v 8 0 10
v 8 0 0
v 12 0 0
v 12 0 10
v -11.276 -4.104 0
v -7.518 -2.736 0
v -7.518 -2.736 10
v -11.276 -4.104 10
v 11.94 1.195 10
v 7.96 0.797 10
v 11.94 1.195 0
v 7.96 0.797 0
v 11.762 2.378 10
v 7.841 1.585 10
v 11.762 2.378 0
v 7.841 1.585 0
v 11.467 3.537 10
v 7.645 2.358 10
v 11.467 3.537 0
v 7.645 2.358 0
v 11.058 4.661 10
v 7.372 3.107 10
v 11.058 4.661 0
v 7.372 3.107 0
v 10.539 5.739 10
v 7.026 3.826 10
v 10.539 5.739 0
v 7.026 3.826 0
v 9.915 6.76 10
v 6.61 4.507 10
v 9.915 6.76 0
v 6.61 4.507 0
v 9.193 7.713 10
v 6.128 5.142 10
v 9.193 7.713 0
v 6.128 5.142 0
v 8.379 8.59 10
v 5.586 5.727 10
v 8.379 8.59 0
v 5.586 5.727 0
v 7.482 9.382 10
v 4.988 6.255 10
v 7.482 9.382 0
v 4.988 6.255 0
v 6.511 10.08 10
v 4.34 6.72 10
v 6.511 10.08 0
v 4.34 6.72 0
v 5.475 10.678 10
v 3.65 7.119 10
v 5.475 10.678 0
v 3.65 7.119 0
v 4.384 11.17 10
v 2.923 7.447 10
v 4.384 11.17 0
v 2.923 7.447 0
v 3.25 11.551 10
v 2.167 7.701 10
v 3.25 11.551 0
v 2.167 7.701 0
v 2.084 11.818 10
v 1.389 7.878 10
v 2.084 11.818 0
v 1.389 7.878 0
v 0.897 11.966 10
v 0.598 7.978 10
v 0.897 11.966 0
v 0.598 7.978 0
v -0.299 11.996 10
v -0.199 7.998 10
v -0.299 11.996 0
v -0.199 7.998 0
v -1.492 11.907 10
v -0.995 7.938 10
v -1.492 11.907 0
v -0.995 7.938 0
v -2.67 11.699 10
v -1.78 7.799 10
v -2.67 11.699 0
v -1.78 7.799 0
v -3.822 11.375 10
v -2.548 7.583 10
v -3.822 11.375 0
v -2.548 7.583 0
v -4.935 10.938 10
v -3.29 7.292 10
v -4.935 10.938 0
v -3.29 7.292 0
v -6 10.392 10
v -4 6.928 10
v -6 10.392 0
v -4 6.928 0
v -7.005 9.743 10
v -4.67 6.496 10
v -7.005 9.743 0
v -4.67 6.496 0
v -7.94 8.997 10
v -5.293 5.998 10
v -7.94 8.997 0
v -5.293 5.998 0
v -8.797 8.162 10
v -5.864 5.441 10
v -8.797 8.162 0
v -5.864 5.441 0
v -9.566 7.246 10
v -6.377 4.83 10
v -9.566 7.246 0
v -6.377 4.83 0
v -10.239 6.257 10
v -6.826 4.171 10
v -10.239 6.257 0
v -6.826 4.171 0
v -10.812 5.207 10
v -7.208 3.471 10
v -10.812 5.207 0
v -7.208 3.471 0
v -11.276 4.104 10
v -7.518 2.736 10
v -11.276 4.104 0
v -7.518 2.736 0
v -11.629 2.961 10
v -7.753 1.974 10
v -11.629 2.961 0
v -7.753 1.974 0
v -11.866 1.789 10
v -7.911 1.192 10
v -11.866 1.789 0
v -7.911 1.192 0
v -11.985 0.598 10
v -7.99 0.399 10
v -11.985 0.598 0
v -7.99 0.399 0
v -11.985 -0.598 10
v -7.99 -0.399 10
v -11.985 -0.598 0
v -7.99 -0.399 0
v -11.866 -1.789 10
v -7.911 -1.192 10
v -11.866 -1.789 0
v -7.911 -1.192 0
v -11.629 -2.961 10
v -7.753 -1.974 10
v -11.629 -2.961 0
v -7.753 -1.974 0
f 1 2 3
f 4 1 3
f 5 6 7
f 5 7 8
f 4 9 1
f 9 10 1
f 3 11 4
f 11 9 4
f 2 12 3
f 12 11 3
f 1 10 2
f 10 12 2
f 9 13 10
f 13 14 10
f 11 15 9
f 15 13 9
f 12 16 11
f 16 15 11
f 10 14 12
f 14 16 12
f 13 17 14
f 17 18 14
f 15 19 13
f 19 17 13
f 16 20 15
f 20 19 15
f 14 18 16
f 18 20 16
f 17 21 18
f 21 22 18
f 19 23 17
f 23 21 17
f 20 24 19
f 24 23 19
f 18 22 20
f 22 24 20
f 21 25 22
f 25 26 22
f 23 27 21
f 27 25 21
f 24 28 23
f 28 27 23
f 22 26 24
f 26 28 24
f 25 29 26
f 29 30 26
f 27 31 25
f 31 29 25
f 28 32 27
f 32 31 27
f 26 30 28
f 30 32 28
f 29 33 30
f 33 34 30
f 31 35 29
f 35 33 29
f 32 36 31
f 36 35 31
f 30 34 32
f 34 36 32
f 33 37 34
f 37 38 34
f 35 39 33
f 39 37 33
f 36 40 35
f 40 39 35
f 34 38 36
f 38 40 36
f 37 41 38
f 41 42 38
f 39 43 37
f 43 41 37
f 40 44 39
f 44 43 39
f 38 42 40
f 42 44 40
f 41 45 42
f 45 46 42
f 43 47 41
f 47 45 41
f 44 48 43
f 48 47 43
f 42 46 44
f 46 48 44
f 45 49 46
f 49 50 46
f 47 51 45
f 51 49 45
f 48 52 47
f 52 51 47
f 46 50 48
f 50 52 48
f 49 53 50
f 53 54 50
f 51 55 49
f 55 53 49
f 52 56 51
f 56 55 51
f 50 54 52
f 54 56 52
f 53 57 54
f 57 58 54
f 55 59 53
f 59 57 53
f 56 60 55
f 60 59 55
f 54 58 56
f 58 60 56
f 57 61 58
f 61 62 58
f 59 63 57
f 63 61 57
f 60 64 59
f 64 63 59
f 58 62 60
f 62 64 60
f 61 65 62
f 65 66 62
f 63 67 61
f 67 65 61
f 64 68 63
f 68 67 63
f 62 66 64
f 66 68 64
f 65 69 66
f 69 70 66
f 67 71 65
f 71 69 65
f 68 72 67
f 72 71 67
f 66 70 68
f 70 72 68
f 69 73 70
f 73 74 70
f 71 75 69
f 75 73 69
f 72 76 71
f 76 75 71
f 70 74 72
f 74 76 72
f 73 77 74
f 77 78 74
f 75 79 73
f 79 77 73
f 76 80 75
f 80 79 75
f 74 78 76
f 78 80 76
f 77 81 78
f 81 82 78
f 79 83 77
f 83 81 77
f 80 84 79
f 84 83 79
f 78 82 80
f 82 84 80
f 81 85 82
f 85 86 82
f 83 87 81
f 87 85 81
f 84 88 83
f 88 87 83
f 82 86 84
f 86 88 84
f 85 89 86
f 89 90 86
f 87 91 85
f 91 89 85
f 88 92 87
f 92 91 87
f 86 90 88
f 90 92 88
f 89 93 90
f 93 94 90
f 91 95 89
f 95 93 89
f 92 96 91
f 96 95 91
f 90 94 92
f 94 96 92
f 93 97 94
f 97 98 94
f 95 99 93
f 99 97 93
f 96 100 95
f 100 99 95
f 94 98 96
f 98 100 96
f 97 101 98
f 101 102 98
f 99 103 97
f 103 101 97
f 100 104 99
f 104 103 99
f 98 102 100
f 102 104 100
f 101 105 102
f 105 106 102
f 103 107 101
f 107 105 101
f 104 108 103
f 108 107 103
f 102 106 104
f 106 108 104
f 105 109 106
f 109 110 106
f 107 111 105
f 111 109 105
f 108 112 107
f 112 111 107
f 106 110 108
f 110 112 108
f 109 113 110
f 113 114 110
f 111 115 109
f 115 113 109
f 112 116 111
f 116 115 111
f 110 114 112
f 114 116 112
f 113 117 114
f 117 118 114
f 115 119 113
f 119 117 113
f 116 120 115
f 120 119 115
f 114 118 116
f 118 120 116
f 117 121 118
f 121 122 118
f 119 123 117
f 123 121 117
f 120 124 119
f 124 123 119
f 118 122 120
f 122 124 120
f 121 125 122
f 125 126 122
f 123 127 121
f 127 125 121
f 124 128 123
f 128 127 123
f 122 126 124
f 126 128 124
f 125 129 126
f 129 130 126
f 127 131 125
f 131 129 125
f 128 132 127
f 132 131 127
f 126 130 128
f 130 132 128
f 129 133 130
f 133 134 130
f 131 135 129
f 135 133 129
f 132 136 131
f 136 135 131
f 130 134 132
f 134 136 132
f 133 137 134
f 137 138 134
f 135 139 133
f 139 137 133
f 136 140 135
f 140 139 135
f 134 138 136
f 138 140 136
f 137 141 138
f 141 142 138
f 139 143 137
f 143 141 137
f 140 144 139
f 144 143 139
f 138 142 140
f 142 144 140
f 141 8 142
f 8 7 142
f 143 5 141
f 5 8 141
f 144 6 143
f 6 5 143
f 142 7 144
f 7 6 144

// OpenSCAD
// Construct: rotate_extrude() through a partial angle.
rotate_extrude(angle = 200, $fn = 64) translate([8, 0]) square([4, 10]);
